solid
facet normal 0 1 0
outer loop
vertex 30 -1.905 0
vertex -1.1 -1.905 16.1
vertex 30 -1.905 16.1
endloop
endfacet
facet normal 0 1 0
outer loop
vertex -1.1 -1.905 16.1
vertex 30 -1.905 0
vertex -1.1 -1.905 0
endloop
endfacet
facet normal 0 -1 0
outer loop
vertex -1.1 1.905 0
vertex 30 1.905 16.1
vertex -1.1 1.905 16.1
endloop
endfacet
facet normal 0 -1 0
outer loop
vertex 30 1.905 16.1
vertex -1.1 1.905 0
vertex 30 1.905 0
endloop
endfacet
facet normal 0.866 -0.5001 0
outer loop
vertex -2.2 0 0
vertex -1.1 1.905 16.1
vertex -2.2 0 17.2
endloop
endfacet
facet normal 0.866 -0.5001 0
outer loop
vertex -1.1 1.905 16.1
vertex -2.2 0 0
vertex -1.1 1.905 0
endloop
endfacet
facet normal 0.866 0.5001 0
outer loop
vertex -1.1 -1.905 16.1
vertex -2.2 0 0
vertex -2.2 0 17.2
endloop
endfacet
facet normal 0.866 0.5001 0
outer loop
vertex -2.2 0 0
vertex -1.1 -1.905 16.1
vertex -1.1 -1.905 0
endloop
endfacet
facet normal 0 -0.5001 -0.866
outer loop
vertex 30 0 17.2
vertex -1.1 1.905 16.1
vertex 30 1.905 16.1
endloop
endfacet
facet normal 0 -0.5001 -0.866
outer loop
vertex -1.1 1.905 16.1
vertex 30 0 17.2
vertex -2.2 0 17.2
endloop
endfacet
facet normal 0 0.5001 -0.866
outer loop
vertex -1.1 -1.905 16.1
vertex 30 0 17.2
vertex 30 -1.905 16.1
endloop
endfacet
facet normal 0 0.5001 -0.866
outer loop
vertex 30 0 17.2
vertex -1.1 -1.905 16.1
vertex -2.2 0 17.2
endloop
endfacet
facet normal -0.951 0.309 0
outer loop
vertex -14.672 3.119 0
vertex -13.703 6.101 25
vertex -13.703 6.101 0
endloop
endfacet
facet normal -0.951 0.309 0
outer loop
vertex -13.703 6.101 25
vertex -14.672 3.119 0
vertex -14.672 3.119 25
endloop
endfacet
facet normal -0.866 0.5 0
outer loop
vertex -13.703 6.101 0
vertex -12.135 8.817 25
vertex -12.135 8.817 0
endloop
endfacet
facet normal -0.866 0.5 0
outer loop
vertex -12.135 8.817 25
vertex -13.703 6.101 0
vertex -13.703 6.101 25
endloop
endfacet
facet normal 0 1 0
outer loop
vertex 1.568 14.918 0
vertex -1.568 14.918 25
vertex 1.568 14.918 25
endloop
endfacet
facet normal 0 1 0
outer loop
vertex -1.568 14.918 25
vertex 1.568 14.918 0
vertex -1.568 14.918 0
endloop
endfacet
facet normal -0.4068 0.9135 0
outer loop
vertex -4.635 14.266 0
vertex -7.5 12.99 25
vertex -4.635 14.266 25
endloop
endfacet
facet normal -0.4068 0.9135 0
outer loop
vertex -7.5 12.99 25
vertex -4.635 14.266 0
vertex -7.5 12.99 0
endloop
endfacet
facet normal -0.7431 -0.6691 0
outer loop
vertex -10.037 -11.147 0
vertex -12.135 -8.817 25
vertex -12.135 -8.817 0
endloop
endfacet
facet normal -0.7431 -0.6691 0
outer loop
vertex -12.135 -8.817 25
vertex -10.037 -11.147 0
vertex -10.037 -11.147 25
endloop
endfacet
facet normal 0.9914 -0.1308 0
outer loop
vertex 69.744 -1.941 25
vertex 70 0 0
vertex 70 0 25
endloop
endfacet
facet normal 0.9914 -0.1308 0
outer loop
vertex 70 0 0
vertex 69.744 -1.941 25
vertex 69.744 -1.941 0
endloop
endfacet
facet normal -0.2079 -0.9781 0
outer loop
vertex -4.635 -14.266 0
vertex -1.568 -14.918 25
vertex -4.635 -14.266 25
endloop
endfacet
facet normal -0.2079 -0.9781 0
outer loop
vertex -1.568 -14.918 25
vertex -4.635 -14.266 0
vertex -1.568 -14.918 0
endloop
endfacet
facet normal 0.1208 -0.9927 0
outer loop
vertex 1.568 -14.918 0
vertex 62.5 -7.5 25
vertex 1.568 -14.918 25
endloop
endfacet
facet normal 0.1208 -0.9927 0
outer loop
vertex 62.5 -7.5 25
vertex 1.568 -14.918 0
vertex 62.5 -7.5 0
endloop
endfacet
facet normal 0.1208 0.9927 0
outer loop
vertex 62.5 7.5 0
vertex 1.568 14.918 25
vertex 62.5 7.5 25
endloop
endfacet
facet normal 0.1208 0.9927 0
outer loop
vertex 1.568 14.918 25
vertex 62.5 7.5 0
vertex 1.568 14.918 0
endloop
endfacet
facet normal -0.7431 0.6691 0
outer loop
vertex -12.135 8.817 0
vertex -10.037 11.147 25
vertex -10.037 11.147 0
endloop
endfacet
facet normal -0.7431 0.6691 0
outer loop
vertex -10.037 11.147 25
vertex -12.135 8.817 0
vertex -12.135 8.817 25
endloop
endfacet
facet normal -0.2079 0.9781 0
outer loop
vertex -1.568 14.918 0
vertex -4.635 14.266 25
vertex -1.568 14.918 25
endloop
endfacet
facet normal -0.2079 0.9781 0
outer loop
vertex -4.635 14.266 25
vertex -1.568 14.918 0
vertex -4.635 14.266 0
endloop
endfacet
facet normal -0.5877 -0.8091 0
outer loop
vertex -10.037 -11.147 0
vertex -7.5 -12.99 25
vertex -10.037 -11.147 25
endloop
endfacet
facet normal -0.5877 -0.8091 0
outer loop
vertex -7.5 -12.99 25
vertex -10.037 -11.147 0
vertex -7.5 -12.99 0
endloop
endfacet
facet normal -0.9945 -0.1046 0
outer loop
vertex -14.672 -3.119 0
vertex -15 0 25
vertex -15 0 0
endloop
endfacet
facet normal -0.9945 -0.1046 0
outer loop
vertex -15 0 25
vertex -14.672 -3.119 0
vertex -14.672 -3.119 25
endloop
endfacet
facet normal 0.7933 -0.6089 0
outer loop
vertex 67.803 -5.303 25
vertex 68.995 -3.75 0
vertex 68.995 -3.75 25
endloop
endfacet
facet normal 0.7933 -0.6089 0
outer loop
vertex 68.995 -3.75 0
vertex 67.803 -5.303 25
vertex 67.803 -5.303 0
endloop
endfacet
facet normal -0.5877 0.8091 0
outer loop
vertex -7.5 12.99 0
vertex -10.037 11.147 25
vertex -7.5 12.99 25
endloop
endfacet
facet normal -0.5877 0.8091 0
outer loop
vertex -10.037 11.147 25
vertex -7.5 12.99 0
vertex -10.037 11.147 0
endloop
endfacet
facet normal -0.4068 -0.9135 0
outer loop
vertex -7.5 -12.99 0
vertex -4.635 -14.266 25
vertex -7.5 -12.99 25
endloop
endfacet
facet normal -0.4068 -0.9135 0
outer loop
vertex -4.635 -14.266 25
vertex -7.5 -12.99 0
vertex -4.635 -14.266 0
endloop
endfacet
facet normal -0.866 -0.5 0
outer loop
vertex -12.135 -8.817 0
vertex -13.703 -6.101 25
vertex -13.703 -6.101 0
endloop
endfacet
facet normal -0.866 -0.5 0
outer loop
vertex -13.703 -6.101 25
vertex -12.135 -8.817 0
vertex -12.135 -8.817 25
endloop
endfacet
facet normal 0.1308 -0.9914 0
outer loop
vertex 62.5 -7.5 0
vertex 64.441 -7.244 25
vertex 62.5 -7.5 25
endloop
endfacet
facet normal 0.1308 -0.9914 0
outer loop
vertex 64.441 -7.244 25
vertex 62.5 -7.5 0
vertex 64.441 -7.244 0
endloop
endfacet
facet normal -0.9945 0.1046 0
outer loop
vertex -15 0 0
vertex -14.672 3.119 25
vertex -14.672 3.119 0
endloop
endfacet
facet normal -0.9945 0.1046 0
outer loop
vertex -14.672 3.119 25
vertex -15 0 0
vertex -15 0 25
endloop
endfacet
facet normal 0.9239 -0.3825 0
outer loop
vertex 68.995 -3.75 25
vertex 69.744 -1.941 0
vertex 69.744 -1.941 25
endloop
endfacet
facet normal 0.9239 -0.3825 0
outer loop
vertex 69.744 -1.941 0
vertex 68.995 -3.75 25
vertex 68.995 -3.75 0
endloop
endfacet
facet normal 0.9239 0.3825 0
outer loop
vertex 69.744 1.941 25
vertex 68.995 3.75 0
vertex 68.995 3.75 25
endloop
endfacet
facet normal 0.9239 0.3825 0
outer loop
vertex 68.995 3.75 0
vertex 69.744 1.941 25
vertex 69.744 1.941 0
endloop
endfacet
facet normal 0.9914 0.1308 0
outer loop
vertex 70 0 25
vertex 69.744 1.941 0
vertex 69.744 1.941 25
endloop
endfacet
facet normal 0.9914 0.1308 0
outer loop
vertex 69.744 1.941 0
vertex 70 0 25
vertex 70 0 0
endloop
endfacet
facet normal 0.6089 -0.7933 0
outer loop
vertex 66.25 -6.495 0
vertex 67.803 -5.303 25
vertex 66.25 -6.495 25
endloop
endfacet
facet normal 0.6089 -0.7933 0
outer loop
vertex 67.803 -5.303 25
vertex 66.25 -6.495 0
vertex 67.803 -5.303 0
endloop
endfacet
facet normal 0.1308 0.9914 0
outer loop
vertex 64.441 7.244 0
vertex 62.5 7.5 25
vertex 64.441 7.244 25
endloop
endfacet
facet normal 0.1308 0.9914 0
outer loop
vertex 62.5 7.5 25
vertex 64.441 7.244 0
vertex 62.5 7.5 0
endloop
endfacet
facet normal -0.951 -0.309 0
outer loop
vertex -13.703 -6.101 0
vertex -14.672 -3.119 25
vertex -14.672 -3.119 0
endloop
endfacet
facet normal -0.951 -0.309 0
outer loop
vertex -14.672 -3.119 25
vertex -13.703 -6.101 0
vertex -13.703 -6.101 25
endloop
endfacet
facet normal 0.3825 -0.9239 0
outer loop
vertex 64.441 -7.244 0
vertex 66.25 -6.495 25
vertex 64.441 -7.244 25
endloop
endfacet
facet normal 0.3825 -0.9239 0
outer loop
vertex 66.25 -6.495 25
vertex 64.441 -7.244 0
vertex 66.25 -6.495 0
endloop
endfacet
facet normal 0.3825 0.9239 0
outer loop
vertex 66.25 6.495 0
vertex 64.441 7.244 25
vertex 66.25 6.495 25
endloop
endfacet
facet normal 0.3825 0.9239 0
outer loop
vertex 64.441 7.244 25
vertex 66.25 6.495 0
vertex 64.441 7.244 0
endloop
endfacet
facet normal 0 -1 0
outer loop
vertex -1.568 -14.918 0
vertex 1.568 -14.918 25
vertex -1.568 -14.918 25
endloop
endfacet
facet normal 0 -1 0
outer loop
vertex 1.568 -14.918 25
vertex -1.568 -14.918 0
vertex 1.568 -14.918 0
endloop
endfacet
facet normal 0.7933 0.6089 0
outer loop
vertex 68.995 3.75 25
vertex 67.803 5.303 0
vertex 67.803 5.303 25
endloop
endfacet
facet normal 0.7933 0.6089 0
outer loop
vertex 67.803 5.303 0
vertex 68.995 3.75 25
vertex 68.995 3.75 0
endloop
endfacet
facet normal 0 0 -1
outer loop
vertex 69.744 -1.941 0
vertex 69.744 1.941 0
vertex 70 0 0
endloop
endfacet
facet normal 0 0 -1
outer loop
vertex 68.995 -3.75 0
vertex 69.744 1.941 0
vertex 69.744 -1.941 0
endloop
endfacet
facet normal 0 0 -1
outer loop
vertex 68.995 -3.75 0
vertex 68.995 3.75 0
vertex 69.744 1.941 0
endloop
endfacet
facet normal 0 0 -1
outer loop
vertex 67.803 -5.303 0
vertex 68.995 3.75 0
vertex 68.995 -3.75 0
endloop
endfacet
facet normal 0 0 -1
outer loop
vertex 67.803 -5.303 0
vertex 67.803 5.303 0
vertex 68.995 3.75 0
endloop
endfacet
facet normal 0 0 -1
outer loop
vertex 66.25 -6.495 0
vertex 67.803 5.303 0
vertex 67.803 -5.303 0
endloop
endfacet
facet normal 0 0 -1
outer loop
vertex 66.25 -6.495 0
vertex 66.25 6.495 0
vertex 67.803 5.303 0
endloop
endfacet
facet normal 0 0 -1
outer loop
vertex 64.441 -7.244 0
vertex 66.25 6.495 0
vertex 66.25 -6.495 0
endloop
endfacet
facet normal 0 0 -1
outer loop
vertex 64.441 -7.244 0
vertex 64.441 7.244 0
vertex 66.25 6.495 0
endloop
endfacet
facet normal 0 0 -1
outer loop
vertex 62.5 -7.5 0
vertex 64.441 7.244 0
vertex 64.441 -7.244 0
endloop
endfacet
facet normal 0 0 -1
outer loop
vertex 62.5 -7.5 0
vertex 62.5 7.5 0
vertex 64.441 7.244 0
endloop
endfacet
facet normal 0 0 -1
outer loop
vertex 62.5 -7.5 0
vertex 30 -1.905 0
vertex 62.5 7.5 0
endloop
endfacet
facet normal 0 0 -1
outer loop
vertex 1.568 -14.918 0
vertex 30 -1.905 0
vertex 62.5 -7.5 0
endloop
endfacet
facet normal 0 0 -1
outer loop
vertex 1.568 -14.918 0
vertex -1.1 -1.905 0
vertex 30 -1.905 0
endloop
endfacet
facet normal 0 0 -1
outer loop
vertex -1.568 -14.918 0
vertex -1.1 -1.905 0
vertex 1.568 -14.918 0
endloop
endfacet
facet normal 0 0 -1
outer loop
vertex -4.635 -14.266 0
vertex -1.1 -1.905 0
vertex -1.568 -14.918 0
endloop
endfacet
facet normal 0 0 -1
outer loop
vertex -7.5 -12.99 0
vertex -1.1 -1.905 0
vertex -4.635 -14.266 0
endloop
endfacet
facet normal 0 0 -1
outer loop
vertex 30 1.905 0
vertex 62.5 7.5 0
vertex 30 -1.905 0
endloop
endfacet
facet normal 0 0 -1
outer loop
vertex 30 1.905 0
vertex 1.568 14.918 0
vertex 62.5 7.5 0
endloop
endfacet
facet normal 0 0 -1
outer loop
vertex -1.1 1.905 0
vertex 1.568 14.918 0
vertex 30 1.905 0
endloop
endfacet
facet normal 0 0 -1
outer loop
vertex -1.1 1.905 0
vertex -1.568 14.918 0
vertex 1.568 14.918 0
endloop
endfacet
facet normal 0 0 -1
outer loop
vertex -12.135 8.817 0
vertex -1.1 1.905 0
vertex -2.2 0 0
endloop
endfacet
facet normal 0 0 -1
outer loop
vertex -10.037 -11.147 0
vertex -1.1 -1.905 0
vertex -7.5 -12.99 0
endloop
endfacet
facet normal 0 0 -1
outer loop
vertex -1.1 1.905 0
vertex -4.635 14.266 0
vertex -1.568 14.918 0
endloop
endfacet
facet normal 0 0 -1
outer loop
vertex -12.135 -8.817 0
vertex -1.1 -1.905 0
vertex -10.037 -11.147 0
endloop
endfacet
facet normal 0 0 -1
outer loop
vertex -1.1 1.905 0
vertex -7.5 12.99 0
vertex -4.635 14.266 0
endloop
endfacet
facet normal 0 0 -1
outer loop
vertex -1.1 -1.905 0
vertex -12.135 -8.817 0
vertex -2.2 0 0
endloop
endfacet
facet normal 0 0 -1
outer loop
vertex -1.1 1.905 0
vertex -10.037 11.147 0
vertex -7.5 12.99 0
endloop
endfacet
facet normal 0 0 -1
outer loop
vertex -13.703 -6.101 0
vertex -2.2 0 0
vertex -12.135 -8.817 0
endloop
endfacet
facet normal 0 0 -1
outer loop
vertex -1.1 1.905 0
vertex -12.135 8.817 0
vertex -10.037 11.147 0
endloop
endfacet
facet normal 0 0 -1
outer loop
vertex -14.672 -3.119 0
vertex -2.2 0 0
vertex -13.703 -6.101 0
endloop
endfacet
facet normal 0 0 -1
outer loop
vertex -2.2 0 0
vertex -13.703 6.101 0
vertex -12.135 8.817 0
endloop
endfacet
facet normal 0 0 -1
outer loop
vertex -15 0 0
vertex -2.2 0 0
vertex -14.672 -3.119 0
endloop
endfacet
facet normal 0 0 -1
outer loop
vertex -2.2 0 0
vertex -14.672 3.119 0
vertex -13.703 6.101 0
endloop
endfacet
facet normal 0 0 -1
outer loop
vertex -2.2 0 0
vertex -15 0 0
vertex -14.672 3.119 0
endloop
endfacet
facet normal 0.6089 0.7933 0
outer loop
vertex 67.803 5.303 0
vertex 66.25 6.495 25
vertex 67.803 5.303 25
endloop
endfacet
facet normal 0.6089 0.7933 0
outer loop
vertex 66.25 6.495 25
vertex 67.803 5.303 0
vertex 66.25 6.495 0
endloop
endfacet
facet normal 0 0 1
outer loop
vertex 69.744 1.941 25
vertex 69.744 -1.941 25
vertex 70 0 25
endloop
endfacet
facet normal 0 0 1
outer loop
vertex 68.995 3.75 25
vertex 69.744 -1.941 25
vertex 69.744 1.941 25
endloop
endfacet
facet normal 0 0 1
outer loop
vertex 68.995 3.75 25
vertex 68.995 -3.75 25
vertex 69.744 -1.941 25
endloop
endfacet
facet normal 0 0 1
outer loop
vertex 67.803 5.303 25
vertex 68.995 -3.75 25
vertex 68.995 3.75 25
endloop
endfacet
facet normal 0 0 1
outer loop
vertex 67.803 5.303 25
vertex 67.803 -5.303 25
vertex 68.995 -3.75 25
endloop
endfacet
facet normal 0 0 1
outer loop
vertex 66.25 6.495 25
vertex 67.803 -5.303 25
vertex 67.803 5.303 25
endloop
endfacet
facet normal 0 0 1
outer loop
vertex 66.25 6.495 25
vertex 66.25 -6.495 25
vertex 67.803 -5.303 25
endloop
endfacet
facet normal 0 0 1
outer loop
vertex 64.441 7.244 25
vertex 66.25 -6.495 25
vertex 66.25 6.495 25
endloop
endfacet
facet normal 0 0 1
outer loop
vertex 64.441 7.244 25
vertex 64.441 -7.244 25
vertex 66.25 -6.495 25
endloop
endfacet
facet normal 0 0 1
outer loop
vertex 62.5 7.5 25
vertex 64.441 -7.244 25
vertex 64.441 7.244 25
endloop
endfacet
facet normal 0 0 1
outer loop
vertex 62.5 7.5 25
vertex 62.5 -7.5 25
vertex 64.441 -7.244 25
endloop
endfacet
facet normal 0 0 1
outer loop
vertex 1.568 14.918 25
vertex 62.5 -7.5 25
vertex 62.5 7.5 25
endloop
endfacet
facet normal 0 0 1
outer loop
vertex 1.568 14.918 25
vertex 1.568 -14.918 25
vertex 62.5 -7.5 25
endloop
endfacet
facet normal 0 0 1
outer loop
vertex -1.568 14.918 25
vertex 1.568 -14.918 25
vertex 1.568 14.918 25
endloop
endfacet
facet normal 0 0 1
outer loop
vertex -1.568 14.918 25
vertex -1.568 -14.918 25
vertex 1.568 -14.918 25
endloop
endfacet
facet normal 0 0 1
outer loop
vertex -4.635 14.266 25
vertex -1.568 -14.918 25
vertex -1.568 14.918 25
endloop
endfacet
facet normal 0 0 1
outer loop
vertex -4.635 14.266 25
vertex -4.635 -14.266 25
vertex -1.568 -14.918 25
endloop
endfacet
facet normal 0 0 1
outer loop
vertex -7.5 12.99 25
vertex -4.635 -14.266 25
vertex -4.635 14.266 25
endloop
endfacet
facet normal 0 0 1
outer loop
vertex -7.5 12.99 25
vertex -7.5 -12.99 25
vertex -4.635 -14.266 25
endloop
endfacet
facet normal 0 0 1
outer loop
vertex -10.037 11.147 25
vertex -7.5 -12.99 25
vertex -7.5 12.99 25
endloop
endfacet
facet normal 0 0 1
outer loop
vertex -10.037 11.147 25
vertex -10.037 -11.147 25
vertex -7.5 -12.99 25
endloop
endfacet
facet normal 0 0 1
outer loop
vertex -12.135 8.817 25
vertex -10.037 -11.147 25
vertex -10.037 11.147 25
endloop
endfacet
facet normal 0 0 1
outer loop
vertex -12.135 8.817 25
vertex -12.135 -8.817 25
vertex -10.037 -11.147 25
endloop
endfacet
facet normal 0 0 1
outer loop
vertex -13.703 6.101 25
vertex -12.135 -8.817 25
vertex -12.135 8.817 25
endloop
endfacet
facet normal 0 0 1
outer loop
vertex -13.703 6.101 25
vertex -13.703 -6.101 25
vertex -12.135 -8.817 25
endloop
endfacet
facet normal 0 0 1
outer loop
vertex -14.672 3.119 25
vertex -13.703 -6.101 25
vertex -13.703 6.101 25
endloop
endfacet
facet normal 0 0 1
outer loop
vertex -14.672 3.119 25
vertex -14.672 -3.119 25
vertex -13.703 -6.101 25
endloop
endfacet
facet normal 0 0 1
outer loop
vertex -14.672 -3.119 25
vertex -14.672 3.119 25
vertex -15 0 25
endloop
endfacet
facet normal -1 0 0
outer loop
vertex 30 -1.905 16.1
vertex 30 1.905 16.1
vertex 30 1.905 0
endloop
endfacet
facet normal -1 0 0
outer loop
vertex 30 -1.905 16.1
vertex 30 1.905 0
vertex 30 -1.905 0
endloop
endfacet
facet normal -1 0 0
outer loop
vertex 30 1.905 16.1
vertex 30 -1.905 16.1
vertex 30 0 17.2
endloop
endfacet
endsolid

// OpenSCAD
// file: physical_dimensions.scad
//Physically bound settings.
printing_play = 0.2; //Horizontal error in 3D printing.
printing_overhang = 50; //Maximum overhang angle. 90 is perfect bridging. 0 is no overhang possible.

movement_play = 0.2; //Play to leave if stuff has to move past each other.

hexkey_radius = 2; //Radius of circumscribed circle around hex key.
hexkey_short_length = 30; //Length of short end.//TODO: How long is this?
hexkey_long_length = 100; //TODO: How long is this?
hexkey_turn_radius = 10; //TODO: Also unknown.

ball_radius = 15; //Standard pinball size (7/6 inch).

m3_bolt_radius = 1.5;
m3_nut_radius = 5.5 / 2;
m3_nut_height = 2.4;

flipper_solenoid_width = 13;
flipper_solenoid_height = 15;
flipper_solenoid_length = 30;
flipper_solenoid_pin_radius = 2;
flipper_solenoid_pin_retracted = 8.5; //Length when retracted.
flipper_solenoid_pin_expansion = 10; //Additional length when expanded.
flipper_solenoid_pinhole_position = 2.5; //Distance from centre of hole to tip of pin.
flipper_solenoid_pinhole_radius = m3_bolt_radius;
flipper_solenoid_pingap_thickness = 1.6;
flipper_solenoid_pingap_depth = 7;
flipper_solenoid_screw_radius = m3_bolt_radius;
flipper_solenoid_screw1_position = 8; //Distance from front.
flipper_solenoid_screw2_position = 15 + flipper_solenoid_screw1_position;
flipper_solenoid_screw_depth = 4; //Unknown.

spring_end_thickness = 2; //How thick the attachment part of the spring is.
spring_radius = 4; //Radius of the coil of the spring.
// main file
include <physical_dimensions.scad>

//Preference settings.
length = 70; //Distance between rotation point and tip of flipper.
big_radius = 15;
small_radius = 7.5;
height = 25;

//Enable once supporting OpenSCAD with asserts (currently only Nightly).
if(version_num() >= 20181007) { //Assertions was merged on 2018-10-7.
	assert(length - small_radius > hexkey_short_length); //Key would protrude at the small end.
	assert(height > ball_radius + hexkey_radius); //Key would protrude at the top side.
	assert(small_radius > hexkey_radius); //Key would protrude at the sides.
	assert(big_radius > hexkey_radius);
	assert(big_radius > small_radius); //Would be lopsided.
}

module flipper_bat() {
	difference() {
		hull() {
			cylinder(r=big_radius, h=height);
			translate([length - small_radius, 0, 0]) {
				cylinder(r=small_radius, h=height);
			}
		}
		//Make sure strongest part is at ball height.
		cylinder($fn=6, r=hexkey_radius + printing_play, h=ball_radius);
		translate([0, 0, ball_radius]) {
			rotate([0, 90, 0]) {
				cylinder($fn=6, r=hexkey_radius + printing_play, h=hexkey_short_length);
			}
		}
		intersection() {
			cylinder($fn=6, r=hexkey_radius + printing_play, h=ball_radius + hexkey_radius + printing_play);
			translate([-hexkey_radius - printing_play, 0, ball_radius]) {
				rotate([0, 90, 0]) {
					cylinder($fn=6, r=hexkey_radius + printing_play, h=hexkey_short_length + hexkey_radius + printing_play);
				}
			}
		}

		inscribed_radius = sqrt(3) * (hexkey_radius + printing_play) / 2; //Formula for inscribed radius of hexagon.
		translate([0, -inscribed_radius, 0]) {
			cube([hexkey_short_length, inscribed_radius * 2, ball_radius]);
		}
	}
}

//Debug.
flipper_bat();
